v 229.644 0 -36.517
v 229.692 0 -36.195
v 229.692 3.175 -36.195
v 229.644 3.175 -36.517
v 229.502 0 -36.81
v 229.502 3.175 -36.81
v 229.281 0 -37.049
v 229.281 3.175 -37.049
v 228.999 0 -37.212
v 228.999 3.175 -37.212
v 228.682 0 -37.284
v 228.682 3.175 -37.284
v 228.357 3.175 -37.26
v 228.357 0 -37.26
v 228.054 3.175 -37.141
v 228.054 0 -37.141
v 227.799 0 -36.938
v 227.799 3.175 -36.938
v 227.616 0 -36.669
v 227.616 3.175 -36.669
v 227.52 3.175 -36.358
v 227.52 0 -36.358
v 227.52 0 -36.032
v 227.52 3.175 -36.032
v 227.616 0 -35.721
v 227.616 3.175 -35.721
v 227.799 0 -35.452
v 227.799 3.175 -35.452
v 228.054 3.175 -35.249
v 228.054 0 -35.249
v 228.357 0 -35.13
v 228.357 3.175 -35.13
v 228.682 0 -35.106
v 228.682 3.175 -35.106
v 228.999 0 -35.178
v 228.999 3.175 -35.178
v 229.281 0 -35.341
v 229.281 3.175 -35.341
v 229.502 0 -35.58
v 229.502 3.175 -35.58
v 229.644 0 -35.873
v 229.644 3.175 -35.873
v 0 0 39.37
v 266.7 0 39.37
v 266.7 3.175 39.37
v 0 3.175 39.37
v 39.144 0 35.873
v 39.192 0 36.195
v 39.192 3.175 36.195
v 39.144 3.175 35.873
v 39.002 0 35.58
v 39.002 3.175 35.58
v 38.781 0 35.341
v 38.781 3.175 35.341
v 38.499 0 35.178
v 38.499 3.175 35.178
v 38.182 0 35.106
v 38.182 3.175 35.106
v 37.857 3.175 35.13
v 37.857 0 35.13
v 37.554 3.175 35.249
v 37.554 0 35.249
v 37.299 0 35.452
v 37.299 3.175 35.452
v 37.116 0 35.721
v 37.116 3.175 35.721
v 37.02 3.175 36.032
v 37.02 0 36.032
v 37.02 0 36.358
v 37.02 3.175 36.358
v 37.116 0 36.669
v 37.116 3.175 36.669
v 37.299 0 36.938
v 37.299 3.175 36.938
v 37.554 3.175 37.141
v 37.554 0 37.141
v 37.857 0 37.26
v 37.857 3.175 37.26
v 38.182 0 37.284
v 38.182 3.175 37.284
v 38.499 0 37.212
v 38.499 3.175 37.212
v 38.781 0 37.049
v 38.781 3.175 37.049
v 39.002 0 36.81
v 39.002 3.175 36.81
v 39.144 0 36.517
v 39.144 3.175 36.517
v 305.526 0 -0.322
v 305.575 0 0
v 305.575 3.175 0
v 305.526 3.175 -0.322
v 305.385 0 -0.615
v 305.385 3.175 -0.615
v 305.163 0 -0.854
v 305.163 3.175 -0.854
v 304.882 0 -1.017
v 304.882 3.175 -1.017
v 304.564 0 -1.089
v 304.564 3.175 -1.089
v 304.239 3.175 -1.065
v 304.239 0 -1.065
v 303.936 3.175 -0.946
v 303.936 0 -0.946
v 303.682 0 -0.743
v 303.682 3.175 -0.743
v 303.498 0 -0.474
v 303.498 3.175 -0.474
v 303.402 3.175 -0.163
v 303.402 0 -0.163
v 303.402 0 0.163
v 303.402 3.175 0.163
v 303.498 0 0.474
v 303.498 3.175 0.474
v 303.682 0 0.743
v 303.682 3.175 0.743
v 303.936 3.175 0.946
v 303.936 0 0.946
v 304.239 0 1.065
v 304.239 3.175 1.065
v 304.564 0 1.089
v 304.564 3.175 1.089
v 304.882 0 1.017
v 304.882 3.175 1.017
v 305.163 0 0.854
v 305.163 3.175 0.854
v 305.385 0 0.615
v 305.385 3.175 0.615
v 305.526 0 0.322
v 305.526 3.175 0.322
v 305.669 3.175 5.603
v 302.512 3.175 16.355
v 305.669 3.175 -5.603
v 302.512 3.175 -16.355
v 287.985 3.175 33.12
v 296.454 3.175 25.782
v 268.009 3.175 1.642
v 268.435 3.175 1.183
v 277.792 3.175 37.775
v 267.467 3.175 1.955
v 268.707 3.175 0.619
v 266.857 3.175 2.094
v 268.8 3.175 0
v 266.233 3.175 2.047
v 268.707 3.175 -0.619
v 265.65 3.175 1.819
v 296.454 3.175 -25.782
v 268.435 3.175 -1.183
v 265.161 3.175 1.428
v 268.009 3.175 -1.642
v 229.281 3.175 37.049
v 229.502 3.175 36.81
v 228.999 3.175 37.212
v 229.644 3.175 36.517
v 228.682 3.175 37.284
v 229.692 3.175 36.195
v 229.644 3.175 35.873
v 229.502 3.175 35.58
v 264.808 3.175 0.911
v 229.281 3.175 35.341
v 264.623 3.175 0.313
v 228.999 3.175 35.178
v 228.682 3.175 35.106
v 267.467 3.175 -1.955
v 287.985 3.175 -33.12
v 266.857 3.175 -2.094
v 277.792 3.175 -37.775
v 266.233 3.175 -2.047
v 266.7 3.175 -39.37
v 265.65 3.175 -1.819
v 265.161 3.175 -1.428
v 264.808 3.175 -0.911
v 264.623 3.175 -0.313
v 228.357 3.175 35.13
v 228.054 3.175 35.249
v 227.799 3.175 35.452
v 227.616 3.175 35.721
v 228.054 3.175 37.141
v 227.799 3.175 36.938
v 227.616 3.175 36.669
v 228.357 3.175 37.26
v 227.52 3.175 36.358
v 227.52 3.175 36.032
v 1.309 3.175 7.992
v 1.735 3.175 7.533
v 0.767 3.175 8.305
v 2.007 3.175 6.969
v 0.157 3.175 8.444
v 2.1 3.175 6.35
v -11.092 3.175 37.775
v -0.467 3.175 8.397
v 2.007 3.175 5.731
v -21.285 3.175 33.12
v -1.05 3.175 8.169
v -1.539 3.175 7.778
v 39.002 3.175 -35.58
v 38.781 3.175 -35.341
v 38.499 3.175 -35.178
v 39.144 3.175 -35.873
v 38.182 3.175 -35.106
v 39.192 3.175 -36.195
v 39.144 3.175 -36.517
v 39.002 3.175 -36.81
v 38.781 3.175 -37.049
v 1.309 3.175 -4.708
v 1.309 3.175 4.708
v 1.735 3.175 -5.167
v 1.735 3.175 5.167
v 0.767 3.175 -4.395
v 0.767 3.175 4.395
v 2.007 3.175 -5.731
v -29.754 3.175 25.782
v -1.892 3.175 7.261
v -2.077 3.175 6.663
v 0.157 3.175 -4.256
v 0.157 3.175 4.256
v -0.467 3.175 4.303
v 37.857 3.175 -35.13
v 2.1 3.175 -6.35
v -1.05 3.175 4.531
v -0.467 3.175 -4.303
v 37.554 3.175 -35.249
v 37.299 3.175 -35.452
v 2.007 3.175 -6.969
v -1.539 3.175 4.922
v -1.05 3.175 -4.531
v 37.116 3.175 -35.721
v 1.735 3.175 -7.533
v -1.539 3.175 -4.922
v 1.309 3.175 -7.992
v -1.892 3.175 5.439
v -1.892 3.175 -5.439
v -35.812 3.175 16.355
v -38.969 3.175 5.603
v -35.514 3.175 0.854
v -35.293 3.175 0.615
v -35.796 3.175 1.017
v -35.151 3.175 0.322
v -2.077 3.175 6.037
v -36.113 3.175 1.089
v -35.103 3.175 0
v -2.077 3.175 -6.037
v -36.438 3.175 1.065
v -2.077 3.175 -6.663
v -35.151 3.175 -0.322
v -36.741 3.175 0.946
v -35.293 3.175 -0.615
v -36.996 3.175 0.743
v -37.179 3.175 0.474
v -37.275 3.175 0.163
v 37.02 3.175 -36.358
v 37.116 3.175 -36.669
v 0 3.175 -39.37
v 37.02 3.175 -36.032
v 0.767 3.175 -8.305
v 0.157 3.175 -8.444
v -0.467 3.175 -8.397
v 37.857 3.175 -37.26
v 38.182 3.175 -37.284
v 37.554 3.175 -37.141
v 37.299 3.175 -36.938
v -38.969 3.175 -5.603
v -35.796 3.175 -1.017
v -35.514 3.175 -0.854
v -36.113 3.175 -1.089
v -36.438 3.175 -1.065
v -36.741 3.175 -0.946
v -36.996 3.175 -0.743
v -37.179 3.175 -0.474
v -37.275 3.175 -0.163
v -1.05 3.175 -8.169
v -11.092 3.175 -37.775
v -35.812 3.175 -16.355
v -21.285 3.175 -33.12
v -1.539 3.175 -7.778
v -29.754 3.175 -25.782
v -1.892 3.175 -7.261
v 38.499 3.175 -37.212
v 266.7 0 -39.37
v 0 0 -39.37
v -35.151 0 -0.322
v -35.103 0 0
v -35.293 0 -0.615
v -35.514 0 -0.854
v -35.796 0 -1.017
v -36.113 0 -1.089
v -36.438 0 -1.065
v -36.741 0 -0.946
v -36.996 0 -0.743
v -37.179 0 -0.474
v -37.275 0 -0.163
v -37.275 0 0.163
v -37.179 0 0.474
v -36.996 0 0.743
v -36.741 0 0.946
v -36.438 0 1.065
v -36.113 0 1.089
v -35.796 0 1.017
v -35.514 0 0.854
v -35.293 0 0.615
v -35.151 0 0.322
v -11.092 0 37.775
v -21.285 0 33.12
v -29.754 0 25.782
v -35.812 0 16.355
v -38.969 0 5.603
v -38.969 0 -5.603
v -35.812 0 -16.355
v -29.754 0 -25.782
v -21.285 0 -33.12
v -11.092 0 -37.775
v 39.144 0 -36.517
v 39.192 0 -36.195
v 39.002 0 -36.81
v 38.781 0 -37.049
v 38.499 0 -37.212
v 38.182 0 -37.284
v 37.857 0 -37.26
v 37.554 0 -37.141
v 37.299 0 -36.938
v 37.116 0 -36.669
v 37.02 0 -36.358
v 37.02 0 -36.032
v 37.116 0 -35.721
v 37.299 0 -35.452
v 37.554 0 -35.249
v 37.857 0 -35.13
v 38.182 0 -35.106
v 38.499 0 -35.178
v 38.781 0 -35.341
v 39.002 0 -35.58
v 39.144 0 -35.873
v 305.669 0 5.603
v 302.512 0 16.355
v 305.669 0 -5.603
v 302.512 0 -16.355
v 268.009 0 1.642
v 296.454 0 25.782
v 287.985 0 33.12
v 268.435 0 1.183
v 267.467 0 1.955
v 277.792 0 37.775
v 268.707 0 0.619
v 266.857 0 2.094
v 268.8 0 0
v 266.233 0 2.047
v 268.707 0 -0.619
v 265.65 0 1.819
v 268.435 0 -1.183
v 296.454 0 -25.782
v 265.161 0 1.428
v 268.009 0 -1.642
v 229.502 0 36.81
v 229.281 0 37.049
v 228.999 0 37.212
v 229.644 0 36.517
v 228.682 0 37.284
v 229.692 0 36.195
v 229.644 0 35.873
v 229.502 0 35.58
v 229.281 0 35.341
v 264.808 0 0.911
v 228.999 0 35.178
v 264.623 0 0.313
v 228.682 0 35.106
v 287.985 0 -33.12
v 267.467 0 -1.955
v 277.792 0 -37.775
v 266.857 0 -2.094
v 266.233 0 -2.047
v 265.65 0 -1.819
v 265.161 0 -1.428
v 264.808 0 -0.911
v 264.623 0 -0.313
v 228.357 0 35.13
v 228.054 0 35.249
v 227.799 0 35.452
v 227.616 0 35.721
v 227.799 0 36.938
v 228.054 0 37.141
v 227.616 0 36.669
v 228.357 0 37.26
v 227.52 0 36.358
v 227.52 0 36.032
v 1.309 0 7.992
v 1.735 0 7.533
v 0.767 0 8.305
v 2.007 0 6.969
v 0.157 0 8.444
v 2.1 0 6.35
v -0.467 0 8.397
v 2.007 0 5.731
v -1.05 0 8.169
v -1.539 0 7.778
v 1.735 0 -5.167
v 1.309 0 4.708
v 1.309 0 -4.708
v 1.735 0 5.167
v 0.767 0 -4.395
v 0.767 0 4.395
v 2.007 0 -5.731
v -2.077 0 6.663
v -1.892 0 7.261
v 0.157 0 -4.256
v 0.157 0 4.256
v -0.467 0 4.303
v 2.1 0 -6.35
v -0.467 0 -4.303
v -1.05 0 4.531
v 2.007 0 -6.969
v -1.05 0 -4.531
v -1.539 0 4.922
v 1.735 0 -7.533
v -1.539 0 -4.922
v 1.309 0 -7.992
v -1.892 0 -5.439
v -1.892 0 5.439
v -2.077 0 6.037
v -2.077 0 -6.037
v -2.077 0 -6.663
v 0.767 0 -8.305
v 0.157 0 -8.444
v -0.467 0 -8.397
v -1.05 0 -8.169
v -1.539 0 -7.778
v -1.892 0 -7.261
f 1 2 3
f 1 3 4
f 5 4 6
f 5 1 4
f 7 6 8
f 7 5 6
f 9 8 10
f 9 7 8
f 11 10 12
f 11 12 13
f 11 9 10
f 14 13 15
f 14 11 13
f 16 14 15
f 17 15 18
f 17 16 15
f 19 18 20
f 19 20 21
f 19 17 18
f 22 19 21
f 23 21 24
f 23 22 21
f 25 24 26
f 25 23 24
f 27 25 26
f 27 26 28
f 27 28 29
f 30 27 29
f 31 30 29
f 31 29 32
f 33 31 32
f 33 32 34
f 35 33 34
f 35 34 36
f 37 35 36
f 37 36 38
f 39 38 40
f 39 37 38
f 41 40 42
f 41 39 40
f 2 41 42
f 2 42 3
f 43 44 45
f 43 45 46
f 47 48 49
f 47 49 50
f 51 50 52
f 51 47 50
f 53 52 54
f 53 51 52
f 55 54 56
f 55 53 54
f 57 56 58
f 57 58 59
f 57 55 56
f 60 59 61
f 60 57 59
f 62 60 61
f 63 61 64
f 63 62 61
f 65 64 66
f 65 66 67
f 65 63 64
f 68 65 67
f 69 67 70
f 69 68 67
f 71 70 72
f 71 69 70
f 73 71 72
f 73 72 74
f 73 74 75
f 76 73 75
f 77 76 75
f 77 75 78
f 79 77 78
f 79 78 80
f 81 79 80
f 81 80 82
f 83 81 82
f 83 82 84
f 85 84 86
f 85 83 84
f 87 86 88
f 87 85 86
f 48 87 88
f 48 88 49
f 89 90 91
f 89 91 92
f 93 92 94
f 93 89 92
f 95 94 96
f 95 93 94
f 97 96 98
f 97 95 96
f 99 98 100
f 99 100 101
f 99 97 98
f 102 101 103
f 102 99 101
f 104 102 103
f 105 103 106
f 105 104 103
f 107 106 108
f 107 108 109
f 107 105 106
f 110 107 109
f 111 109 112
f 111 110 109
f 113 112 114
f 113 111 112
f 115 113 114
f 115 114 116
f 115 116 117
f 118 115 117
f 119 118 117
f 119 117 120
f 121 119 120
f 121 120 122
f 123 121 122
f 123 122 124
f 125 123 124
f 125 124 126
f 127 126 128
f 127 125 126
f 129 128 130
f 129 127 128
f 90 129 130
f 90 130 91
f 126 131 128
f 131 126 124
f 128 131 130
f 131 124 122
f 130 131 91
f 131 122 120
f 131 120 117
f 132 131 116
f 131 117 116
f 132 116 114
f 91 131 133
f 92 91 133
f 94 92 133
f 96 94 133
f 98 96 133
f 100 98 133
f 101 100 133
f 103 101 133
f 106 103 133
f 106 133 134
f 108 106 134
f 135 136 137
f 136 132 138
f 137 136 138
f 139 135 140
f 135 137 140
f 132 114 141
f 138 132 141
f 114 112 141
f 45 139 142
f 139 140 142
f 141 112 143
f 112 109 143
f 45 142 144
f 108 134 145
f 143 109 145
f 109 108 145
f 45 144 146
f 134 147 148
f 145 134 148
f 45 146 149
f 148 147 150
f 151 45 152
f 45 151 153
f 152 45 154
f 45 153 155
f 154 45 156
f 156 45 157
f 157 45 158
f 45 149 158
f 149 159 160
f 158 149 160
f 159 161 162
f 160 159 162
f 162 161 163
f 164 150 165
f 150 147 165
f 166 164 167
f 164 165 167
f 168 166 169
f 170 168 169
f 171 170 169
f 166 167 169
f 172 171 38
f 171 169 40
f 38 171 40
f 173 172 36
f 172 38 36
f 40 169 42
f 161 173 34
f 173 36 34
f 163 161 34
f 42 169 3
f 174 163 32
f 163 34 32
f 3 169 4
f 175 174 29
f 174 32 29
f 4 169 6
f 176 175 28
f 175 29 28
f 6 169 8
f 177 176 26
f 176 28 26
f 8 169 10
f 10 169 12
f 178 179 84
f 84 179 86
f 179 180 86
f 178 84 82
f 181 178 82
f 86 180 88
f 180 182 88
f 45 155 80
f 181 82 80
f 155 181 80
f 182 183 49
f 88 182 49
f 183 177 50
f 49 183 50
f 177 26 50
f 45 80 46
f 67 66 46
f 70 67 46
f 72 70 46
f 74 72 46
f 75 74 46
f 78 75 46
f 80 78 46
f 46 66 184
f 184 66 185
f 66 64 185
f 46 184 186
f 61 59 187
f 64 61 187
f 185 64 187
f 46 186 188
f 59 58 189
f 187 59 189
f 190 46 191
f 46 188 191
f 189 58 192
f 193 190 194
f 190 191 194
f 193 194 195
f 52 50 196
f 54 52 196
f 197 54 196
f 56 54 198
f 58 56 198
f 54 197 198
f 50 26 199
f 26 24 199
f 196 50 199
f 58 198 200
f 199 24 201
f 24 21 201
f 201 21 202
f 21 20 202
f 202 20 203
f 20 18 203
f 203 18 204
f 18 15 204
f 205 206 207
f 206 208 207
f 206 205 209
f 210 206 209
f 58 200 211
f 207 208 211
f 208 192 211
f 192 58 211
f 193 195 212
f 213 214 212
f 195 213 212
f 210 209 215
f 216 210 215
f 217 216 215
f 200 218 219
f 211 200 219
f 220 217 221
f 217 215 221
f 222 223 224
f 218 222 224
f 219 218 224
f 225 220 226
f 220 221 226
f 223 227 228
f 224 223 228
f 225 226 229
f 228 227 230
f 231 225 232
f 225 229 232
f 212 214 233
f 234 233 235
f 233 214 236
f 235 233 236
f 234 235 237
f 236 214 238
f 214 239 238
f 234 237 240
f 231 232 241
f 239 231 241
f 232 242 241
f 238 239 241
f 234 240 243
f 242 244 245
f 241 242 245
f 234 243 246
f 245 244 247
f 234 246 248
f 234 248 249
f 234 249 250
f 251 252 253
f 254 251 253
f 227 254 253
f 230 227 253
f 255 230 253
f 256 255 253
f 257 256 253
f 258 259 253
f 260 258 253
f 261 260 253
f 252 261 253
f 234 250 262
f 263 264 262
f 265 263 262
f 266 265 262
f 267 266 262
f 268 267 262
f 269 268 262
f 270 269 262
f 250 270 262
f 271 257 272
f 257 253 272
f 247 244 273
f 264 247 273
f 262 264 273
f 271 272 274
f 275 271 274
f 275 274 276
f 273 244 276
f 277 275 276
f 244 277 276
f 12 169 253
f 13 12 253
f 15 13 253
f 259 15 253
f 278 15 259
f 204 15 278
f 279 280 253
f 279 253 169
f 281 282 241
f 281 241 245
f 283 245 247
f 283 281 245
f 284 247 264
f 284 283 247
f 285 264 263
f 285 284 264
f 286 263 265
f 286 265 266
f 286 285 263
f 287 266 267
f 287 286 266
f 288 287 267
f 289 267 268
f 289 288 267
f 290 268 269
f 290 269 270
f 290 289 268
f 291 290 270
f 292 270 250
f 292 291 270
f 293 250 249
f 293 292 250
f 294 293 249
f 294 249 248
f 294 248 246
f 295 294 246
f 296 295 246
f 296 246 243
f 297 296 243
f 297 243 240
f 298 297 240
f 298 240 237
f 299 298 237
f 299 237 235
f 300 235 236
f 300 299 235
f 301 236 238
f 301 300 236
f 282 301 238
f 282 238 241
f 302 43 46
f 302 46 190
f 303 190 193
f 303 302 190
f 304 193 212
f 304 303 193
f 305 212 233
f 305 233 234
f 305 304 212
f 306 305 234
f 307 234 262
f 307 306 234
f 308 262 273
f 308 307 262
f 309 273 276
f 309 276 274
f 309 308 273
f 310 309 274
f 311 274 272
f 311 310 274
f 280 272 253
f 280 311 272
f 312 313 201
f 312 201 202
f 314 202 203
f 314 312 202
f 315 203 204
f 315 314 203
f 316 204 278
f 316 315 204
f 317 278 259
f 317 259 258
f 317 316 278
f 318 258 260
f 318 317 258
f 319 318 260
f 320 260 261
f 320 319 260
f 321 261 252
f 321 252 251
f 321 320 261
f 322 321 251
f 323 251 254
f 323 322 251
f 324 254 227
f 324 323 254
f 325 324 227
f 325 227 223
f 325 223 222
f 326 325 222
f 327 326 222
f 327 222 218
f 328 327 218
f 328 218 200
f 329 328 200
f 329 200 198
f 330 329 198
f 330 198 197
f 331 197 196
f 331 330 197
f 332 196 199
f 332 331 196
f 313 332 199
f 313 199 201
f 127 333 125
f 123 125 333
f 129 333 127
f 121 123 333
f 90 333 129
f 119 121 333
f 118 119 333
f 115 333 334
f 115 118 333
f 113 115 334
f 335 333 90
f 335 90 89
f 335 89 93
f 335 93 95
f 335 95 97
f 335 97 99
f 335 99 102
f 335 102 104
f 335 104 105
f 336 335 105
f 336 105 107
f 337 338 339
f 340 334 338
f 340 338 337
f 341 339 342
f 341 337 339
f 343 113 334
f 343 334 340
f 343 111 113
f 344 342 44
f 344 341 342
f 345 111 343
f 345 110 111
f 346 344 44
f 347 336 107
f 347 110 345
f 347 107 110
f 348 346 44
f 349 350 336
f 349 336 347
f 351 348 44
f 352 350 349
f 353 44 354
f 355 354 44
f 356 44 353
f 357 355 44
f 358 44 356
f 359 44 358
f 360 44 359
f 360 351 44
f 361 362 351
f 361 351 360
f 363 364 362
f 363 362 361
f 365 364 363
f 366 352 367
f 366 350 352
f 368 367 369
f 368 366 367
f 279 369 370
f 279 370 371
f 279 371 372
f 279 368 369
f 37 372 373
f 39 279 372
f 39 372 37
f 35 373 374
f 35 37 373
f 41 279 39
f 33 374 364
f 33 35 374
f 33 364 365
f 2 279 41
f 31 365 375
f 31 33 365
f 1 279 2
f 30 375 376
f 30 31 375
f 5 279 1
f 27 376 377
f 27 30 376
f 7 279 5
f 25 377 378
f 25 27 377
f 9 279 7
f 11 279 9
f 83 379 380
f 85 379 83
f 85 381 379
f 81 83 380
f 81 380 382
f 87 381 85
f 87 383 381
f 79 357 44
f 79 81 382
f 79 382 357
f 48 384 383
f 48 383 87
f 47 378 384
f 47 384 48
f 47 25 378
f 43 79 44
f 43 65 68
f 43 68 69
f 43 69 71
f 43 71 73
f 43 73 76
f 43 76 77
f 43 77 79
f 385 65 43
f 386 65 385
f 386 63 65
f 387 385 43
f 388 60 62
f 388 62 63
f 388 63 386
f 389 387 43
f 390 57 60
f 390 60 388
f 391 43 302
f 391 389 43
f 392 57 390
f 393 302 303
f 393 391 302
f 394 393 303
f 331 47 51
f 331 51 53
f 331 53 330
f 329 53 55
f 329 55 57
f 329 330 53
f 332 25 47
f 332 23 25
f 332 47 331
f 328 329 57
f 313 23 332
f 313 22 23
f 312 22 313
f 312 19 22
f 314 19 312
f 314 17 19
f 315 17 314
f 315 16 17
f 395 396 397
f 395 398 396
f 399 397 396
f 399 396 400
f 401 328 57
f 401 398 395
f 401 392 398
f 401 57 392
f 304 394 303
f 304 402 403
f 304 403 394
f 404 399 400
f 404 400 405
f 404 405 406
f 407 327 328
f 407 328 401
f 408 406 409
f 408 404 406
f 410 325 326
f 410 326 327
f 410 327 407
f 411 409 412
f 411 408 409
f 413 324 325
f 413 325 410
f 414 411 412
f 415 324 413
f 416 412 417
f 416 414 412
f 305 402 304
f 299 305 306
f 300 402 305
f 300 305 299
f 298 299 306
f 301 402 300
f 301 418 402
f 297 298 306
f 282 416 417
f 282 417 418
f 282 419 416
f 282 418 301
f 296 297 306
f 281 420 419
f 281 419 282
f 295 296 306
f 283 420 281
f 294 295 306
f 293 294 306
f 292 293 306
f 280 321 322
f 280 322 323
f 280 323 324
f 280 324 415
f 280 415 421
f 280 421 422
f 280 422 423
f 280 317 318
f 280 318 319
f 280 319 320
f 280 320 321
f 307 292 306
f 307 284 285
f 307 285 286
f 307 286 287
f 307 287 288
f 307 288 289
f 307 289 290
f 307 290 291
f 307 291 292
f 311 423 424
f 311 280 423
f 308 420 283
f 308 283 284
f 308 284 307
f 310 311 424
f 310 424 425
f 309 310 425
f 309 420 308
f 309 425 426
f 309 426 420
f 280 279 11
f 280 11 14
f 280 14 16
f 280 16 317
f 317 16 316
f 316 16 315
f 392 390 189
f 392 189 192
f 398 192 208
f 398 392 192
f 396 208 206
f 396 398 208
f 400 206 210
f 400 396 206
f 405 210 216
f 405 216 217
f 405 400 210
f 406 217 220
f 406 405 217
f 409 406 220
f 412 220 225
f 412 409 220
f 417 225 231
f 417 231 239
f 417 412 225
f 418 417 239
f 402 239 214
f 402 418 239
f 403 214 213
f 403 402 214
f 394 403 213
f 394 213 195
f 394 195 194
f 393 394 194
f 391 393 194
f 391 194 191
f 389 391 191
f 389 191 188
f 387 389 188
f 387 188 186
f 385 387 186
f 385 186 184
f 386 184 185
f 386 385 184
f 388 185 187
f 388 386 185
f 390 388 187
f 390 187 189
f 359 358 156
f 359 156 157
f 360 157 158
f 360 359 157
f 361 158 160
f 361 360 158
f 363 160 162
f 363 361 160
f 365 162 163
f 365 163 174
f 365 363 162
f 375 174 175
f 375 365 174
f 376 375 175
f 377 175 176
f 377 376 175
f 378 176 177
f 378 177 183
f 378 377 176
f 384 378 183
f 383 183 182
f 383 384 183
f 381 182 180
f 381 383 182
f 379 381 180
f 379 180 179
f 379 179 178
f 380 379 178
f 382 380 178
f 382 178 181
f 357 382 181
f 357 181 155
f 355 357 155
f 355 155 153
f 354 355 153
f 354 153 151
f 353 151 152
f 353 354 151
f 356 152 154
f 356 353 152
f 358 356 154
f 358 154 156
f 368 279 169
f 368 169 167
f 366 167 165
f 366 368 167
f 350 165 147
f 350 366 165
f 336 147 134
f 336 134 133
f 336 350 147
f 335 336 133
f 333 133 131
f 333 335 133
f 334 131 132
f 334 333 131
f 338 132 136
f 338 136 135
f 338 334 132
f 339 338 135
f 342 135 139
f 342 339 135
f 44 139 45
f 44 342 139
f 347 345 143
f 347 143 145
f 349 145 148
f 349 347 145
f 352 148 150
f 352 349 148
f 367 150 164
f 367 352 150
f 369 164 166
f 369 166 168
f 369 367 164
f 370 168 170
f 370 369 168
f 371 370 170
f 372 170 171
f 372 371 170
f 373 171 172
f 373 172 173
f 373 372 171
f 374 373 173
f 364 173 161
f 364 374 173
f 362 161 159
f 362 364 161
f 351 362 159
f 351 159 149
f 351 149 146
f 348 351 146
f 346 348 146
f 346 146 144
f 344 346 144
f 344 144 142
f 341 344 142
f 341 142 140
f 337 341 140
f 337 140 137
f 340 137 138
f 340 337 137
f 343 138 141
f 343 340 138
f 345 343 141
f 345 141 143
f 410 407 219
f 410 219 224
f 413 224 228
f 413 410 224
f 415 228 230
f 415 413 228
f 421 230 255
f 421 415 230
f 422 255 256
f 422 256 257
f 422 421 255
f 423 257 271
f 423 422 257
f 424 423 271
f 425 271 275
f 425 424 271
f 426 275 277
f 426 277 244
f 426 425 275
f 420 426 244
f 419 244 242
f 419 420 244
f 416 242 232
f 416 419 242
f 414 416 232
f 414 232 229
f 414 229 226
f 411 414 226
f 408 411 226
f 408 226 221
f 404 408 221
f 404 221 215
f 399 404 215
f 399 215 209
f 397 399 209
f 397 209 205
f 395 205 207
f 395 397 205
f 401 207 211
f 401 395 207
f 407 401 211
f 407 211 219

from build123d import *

# Parameters (mm, degrees)
SKETCH1_R           = 1.0922
SKETCH1_R_2         = 2.1
BOSS_EXTRUDE1_DEPTH = 3.175


with BuildPart() as part:
    # Sketch1 → Boss-Extrude1 (new body)
    with BuildSketch(Plane(origin=(0, 0, 0), x_dir=(1, 0, 0), z_dir=(0, 1, 0))):
        with BuildLine():
            Line((0, 39.37), (266.7, 39.37))
            ThreePointArc((266.7, 39.37), (306.07, 0), (266.7, -39.37))
            Line((266.7, -39.37), (0, -39.37))
            ThreePointArc((0, -39.37), (-39.37, 0), (0, 39.37))
        make_face()
        with Locations((38.1, 36.195)):
            Circle(SKETCH1_R, mode=Mode.SUBTRACT)
        with Locations((228.6, 36.195)):
            Circle(SKETCH1_R, mode=Mode.SUBTRACT)
        with Locations((38.1, -36.195)):
            Circle(SKETCH1_R, mode=Mode.SUBTRACT)
        with Locations((228.6, -36.195)):
            Circle(SKETCH1_R, mode=Mode.SUBTRACT)
        with Locations((-36.195, 0)):
            Circle(SKETCH1_R, mode=Mode.SUBTRACT)
        with Locations((304.4825, 0)):
            Circle(SKETCH1_R, mode=Mode.SUBTRACT)
        with Locations((266.7, 0)):
            Circle(SKETCH1_R_2, mode=Mode.SUBTRACT)
        with Locations((0, -6.35)):
            Circle(SKETCH1_R_2, mode=Mode.SUBTRACT)
        with Locations((0, 6.35)):
            Circle(SKETCH1_R_2, mode=Mode.SUBTRACT)
    extrude(amount=BOSS_EXTRUDE1_DEPTH)


solid = part.part
